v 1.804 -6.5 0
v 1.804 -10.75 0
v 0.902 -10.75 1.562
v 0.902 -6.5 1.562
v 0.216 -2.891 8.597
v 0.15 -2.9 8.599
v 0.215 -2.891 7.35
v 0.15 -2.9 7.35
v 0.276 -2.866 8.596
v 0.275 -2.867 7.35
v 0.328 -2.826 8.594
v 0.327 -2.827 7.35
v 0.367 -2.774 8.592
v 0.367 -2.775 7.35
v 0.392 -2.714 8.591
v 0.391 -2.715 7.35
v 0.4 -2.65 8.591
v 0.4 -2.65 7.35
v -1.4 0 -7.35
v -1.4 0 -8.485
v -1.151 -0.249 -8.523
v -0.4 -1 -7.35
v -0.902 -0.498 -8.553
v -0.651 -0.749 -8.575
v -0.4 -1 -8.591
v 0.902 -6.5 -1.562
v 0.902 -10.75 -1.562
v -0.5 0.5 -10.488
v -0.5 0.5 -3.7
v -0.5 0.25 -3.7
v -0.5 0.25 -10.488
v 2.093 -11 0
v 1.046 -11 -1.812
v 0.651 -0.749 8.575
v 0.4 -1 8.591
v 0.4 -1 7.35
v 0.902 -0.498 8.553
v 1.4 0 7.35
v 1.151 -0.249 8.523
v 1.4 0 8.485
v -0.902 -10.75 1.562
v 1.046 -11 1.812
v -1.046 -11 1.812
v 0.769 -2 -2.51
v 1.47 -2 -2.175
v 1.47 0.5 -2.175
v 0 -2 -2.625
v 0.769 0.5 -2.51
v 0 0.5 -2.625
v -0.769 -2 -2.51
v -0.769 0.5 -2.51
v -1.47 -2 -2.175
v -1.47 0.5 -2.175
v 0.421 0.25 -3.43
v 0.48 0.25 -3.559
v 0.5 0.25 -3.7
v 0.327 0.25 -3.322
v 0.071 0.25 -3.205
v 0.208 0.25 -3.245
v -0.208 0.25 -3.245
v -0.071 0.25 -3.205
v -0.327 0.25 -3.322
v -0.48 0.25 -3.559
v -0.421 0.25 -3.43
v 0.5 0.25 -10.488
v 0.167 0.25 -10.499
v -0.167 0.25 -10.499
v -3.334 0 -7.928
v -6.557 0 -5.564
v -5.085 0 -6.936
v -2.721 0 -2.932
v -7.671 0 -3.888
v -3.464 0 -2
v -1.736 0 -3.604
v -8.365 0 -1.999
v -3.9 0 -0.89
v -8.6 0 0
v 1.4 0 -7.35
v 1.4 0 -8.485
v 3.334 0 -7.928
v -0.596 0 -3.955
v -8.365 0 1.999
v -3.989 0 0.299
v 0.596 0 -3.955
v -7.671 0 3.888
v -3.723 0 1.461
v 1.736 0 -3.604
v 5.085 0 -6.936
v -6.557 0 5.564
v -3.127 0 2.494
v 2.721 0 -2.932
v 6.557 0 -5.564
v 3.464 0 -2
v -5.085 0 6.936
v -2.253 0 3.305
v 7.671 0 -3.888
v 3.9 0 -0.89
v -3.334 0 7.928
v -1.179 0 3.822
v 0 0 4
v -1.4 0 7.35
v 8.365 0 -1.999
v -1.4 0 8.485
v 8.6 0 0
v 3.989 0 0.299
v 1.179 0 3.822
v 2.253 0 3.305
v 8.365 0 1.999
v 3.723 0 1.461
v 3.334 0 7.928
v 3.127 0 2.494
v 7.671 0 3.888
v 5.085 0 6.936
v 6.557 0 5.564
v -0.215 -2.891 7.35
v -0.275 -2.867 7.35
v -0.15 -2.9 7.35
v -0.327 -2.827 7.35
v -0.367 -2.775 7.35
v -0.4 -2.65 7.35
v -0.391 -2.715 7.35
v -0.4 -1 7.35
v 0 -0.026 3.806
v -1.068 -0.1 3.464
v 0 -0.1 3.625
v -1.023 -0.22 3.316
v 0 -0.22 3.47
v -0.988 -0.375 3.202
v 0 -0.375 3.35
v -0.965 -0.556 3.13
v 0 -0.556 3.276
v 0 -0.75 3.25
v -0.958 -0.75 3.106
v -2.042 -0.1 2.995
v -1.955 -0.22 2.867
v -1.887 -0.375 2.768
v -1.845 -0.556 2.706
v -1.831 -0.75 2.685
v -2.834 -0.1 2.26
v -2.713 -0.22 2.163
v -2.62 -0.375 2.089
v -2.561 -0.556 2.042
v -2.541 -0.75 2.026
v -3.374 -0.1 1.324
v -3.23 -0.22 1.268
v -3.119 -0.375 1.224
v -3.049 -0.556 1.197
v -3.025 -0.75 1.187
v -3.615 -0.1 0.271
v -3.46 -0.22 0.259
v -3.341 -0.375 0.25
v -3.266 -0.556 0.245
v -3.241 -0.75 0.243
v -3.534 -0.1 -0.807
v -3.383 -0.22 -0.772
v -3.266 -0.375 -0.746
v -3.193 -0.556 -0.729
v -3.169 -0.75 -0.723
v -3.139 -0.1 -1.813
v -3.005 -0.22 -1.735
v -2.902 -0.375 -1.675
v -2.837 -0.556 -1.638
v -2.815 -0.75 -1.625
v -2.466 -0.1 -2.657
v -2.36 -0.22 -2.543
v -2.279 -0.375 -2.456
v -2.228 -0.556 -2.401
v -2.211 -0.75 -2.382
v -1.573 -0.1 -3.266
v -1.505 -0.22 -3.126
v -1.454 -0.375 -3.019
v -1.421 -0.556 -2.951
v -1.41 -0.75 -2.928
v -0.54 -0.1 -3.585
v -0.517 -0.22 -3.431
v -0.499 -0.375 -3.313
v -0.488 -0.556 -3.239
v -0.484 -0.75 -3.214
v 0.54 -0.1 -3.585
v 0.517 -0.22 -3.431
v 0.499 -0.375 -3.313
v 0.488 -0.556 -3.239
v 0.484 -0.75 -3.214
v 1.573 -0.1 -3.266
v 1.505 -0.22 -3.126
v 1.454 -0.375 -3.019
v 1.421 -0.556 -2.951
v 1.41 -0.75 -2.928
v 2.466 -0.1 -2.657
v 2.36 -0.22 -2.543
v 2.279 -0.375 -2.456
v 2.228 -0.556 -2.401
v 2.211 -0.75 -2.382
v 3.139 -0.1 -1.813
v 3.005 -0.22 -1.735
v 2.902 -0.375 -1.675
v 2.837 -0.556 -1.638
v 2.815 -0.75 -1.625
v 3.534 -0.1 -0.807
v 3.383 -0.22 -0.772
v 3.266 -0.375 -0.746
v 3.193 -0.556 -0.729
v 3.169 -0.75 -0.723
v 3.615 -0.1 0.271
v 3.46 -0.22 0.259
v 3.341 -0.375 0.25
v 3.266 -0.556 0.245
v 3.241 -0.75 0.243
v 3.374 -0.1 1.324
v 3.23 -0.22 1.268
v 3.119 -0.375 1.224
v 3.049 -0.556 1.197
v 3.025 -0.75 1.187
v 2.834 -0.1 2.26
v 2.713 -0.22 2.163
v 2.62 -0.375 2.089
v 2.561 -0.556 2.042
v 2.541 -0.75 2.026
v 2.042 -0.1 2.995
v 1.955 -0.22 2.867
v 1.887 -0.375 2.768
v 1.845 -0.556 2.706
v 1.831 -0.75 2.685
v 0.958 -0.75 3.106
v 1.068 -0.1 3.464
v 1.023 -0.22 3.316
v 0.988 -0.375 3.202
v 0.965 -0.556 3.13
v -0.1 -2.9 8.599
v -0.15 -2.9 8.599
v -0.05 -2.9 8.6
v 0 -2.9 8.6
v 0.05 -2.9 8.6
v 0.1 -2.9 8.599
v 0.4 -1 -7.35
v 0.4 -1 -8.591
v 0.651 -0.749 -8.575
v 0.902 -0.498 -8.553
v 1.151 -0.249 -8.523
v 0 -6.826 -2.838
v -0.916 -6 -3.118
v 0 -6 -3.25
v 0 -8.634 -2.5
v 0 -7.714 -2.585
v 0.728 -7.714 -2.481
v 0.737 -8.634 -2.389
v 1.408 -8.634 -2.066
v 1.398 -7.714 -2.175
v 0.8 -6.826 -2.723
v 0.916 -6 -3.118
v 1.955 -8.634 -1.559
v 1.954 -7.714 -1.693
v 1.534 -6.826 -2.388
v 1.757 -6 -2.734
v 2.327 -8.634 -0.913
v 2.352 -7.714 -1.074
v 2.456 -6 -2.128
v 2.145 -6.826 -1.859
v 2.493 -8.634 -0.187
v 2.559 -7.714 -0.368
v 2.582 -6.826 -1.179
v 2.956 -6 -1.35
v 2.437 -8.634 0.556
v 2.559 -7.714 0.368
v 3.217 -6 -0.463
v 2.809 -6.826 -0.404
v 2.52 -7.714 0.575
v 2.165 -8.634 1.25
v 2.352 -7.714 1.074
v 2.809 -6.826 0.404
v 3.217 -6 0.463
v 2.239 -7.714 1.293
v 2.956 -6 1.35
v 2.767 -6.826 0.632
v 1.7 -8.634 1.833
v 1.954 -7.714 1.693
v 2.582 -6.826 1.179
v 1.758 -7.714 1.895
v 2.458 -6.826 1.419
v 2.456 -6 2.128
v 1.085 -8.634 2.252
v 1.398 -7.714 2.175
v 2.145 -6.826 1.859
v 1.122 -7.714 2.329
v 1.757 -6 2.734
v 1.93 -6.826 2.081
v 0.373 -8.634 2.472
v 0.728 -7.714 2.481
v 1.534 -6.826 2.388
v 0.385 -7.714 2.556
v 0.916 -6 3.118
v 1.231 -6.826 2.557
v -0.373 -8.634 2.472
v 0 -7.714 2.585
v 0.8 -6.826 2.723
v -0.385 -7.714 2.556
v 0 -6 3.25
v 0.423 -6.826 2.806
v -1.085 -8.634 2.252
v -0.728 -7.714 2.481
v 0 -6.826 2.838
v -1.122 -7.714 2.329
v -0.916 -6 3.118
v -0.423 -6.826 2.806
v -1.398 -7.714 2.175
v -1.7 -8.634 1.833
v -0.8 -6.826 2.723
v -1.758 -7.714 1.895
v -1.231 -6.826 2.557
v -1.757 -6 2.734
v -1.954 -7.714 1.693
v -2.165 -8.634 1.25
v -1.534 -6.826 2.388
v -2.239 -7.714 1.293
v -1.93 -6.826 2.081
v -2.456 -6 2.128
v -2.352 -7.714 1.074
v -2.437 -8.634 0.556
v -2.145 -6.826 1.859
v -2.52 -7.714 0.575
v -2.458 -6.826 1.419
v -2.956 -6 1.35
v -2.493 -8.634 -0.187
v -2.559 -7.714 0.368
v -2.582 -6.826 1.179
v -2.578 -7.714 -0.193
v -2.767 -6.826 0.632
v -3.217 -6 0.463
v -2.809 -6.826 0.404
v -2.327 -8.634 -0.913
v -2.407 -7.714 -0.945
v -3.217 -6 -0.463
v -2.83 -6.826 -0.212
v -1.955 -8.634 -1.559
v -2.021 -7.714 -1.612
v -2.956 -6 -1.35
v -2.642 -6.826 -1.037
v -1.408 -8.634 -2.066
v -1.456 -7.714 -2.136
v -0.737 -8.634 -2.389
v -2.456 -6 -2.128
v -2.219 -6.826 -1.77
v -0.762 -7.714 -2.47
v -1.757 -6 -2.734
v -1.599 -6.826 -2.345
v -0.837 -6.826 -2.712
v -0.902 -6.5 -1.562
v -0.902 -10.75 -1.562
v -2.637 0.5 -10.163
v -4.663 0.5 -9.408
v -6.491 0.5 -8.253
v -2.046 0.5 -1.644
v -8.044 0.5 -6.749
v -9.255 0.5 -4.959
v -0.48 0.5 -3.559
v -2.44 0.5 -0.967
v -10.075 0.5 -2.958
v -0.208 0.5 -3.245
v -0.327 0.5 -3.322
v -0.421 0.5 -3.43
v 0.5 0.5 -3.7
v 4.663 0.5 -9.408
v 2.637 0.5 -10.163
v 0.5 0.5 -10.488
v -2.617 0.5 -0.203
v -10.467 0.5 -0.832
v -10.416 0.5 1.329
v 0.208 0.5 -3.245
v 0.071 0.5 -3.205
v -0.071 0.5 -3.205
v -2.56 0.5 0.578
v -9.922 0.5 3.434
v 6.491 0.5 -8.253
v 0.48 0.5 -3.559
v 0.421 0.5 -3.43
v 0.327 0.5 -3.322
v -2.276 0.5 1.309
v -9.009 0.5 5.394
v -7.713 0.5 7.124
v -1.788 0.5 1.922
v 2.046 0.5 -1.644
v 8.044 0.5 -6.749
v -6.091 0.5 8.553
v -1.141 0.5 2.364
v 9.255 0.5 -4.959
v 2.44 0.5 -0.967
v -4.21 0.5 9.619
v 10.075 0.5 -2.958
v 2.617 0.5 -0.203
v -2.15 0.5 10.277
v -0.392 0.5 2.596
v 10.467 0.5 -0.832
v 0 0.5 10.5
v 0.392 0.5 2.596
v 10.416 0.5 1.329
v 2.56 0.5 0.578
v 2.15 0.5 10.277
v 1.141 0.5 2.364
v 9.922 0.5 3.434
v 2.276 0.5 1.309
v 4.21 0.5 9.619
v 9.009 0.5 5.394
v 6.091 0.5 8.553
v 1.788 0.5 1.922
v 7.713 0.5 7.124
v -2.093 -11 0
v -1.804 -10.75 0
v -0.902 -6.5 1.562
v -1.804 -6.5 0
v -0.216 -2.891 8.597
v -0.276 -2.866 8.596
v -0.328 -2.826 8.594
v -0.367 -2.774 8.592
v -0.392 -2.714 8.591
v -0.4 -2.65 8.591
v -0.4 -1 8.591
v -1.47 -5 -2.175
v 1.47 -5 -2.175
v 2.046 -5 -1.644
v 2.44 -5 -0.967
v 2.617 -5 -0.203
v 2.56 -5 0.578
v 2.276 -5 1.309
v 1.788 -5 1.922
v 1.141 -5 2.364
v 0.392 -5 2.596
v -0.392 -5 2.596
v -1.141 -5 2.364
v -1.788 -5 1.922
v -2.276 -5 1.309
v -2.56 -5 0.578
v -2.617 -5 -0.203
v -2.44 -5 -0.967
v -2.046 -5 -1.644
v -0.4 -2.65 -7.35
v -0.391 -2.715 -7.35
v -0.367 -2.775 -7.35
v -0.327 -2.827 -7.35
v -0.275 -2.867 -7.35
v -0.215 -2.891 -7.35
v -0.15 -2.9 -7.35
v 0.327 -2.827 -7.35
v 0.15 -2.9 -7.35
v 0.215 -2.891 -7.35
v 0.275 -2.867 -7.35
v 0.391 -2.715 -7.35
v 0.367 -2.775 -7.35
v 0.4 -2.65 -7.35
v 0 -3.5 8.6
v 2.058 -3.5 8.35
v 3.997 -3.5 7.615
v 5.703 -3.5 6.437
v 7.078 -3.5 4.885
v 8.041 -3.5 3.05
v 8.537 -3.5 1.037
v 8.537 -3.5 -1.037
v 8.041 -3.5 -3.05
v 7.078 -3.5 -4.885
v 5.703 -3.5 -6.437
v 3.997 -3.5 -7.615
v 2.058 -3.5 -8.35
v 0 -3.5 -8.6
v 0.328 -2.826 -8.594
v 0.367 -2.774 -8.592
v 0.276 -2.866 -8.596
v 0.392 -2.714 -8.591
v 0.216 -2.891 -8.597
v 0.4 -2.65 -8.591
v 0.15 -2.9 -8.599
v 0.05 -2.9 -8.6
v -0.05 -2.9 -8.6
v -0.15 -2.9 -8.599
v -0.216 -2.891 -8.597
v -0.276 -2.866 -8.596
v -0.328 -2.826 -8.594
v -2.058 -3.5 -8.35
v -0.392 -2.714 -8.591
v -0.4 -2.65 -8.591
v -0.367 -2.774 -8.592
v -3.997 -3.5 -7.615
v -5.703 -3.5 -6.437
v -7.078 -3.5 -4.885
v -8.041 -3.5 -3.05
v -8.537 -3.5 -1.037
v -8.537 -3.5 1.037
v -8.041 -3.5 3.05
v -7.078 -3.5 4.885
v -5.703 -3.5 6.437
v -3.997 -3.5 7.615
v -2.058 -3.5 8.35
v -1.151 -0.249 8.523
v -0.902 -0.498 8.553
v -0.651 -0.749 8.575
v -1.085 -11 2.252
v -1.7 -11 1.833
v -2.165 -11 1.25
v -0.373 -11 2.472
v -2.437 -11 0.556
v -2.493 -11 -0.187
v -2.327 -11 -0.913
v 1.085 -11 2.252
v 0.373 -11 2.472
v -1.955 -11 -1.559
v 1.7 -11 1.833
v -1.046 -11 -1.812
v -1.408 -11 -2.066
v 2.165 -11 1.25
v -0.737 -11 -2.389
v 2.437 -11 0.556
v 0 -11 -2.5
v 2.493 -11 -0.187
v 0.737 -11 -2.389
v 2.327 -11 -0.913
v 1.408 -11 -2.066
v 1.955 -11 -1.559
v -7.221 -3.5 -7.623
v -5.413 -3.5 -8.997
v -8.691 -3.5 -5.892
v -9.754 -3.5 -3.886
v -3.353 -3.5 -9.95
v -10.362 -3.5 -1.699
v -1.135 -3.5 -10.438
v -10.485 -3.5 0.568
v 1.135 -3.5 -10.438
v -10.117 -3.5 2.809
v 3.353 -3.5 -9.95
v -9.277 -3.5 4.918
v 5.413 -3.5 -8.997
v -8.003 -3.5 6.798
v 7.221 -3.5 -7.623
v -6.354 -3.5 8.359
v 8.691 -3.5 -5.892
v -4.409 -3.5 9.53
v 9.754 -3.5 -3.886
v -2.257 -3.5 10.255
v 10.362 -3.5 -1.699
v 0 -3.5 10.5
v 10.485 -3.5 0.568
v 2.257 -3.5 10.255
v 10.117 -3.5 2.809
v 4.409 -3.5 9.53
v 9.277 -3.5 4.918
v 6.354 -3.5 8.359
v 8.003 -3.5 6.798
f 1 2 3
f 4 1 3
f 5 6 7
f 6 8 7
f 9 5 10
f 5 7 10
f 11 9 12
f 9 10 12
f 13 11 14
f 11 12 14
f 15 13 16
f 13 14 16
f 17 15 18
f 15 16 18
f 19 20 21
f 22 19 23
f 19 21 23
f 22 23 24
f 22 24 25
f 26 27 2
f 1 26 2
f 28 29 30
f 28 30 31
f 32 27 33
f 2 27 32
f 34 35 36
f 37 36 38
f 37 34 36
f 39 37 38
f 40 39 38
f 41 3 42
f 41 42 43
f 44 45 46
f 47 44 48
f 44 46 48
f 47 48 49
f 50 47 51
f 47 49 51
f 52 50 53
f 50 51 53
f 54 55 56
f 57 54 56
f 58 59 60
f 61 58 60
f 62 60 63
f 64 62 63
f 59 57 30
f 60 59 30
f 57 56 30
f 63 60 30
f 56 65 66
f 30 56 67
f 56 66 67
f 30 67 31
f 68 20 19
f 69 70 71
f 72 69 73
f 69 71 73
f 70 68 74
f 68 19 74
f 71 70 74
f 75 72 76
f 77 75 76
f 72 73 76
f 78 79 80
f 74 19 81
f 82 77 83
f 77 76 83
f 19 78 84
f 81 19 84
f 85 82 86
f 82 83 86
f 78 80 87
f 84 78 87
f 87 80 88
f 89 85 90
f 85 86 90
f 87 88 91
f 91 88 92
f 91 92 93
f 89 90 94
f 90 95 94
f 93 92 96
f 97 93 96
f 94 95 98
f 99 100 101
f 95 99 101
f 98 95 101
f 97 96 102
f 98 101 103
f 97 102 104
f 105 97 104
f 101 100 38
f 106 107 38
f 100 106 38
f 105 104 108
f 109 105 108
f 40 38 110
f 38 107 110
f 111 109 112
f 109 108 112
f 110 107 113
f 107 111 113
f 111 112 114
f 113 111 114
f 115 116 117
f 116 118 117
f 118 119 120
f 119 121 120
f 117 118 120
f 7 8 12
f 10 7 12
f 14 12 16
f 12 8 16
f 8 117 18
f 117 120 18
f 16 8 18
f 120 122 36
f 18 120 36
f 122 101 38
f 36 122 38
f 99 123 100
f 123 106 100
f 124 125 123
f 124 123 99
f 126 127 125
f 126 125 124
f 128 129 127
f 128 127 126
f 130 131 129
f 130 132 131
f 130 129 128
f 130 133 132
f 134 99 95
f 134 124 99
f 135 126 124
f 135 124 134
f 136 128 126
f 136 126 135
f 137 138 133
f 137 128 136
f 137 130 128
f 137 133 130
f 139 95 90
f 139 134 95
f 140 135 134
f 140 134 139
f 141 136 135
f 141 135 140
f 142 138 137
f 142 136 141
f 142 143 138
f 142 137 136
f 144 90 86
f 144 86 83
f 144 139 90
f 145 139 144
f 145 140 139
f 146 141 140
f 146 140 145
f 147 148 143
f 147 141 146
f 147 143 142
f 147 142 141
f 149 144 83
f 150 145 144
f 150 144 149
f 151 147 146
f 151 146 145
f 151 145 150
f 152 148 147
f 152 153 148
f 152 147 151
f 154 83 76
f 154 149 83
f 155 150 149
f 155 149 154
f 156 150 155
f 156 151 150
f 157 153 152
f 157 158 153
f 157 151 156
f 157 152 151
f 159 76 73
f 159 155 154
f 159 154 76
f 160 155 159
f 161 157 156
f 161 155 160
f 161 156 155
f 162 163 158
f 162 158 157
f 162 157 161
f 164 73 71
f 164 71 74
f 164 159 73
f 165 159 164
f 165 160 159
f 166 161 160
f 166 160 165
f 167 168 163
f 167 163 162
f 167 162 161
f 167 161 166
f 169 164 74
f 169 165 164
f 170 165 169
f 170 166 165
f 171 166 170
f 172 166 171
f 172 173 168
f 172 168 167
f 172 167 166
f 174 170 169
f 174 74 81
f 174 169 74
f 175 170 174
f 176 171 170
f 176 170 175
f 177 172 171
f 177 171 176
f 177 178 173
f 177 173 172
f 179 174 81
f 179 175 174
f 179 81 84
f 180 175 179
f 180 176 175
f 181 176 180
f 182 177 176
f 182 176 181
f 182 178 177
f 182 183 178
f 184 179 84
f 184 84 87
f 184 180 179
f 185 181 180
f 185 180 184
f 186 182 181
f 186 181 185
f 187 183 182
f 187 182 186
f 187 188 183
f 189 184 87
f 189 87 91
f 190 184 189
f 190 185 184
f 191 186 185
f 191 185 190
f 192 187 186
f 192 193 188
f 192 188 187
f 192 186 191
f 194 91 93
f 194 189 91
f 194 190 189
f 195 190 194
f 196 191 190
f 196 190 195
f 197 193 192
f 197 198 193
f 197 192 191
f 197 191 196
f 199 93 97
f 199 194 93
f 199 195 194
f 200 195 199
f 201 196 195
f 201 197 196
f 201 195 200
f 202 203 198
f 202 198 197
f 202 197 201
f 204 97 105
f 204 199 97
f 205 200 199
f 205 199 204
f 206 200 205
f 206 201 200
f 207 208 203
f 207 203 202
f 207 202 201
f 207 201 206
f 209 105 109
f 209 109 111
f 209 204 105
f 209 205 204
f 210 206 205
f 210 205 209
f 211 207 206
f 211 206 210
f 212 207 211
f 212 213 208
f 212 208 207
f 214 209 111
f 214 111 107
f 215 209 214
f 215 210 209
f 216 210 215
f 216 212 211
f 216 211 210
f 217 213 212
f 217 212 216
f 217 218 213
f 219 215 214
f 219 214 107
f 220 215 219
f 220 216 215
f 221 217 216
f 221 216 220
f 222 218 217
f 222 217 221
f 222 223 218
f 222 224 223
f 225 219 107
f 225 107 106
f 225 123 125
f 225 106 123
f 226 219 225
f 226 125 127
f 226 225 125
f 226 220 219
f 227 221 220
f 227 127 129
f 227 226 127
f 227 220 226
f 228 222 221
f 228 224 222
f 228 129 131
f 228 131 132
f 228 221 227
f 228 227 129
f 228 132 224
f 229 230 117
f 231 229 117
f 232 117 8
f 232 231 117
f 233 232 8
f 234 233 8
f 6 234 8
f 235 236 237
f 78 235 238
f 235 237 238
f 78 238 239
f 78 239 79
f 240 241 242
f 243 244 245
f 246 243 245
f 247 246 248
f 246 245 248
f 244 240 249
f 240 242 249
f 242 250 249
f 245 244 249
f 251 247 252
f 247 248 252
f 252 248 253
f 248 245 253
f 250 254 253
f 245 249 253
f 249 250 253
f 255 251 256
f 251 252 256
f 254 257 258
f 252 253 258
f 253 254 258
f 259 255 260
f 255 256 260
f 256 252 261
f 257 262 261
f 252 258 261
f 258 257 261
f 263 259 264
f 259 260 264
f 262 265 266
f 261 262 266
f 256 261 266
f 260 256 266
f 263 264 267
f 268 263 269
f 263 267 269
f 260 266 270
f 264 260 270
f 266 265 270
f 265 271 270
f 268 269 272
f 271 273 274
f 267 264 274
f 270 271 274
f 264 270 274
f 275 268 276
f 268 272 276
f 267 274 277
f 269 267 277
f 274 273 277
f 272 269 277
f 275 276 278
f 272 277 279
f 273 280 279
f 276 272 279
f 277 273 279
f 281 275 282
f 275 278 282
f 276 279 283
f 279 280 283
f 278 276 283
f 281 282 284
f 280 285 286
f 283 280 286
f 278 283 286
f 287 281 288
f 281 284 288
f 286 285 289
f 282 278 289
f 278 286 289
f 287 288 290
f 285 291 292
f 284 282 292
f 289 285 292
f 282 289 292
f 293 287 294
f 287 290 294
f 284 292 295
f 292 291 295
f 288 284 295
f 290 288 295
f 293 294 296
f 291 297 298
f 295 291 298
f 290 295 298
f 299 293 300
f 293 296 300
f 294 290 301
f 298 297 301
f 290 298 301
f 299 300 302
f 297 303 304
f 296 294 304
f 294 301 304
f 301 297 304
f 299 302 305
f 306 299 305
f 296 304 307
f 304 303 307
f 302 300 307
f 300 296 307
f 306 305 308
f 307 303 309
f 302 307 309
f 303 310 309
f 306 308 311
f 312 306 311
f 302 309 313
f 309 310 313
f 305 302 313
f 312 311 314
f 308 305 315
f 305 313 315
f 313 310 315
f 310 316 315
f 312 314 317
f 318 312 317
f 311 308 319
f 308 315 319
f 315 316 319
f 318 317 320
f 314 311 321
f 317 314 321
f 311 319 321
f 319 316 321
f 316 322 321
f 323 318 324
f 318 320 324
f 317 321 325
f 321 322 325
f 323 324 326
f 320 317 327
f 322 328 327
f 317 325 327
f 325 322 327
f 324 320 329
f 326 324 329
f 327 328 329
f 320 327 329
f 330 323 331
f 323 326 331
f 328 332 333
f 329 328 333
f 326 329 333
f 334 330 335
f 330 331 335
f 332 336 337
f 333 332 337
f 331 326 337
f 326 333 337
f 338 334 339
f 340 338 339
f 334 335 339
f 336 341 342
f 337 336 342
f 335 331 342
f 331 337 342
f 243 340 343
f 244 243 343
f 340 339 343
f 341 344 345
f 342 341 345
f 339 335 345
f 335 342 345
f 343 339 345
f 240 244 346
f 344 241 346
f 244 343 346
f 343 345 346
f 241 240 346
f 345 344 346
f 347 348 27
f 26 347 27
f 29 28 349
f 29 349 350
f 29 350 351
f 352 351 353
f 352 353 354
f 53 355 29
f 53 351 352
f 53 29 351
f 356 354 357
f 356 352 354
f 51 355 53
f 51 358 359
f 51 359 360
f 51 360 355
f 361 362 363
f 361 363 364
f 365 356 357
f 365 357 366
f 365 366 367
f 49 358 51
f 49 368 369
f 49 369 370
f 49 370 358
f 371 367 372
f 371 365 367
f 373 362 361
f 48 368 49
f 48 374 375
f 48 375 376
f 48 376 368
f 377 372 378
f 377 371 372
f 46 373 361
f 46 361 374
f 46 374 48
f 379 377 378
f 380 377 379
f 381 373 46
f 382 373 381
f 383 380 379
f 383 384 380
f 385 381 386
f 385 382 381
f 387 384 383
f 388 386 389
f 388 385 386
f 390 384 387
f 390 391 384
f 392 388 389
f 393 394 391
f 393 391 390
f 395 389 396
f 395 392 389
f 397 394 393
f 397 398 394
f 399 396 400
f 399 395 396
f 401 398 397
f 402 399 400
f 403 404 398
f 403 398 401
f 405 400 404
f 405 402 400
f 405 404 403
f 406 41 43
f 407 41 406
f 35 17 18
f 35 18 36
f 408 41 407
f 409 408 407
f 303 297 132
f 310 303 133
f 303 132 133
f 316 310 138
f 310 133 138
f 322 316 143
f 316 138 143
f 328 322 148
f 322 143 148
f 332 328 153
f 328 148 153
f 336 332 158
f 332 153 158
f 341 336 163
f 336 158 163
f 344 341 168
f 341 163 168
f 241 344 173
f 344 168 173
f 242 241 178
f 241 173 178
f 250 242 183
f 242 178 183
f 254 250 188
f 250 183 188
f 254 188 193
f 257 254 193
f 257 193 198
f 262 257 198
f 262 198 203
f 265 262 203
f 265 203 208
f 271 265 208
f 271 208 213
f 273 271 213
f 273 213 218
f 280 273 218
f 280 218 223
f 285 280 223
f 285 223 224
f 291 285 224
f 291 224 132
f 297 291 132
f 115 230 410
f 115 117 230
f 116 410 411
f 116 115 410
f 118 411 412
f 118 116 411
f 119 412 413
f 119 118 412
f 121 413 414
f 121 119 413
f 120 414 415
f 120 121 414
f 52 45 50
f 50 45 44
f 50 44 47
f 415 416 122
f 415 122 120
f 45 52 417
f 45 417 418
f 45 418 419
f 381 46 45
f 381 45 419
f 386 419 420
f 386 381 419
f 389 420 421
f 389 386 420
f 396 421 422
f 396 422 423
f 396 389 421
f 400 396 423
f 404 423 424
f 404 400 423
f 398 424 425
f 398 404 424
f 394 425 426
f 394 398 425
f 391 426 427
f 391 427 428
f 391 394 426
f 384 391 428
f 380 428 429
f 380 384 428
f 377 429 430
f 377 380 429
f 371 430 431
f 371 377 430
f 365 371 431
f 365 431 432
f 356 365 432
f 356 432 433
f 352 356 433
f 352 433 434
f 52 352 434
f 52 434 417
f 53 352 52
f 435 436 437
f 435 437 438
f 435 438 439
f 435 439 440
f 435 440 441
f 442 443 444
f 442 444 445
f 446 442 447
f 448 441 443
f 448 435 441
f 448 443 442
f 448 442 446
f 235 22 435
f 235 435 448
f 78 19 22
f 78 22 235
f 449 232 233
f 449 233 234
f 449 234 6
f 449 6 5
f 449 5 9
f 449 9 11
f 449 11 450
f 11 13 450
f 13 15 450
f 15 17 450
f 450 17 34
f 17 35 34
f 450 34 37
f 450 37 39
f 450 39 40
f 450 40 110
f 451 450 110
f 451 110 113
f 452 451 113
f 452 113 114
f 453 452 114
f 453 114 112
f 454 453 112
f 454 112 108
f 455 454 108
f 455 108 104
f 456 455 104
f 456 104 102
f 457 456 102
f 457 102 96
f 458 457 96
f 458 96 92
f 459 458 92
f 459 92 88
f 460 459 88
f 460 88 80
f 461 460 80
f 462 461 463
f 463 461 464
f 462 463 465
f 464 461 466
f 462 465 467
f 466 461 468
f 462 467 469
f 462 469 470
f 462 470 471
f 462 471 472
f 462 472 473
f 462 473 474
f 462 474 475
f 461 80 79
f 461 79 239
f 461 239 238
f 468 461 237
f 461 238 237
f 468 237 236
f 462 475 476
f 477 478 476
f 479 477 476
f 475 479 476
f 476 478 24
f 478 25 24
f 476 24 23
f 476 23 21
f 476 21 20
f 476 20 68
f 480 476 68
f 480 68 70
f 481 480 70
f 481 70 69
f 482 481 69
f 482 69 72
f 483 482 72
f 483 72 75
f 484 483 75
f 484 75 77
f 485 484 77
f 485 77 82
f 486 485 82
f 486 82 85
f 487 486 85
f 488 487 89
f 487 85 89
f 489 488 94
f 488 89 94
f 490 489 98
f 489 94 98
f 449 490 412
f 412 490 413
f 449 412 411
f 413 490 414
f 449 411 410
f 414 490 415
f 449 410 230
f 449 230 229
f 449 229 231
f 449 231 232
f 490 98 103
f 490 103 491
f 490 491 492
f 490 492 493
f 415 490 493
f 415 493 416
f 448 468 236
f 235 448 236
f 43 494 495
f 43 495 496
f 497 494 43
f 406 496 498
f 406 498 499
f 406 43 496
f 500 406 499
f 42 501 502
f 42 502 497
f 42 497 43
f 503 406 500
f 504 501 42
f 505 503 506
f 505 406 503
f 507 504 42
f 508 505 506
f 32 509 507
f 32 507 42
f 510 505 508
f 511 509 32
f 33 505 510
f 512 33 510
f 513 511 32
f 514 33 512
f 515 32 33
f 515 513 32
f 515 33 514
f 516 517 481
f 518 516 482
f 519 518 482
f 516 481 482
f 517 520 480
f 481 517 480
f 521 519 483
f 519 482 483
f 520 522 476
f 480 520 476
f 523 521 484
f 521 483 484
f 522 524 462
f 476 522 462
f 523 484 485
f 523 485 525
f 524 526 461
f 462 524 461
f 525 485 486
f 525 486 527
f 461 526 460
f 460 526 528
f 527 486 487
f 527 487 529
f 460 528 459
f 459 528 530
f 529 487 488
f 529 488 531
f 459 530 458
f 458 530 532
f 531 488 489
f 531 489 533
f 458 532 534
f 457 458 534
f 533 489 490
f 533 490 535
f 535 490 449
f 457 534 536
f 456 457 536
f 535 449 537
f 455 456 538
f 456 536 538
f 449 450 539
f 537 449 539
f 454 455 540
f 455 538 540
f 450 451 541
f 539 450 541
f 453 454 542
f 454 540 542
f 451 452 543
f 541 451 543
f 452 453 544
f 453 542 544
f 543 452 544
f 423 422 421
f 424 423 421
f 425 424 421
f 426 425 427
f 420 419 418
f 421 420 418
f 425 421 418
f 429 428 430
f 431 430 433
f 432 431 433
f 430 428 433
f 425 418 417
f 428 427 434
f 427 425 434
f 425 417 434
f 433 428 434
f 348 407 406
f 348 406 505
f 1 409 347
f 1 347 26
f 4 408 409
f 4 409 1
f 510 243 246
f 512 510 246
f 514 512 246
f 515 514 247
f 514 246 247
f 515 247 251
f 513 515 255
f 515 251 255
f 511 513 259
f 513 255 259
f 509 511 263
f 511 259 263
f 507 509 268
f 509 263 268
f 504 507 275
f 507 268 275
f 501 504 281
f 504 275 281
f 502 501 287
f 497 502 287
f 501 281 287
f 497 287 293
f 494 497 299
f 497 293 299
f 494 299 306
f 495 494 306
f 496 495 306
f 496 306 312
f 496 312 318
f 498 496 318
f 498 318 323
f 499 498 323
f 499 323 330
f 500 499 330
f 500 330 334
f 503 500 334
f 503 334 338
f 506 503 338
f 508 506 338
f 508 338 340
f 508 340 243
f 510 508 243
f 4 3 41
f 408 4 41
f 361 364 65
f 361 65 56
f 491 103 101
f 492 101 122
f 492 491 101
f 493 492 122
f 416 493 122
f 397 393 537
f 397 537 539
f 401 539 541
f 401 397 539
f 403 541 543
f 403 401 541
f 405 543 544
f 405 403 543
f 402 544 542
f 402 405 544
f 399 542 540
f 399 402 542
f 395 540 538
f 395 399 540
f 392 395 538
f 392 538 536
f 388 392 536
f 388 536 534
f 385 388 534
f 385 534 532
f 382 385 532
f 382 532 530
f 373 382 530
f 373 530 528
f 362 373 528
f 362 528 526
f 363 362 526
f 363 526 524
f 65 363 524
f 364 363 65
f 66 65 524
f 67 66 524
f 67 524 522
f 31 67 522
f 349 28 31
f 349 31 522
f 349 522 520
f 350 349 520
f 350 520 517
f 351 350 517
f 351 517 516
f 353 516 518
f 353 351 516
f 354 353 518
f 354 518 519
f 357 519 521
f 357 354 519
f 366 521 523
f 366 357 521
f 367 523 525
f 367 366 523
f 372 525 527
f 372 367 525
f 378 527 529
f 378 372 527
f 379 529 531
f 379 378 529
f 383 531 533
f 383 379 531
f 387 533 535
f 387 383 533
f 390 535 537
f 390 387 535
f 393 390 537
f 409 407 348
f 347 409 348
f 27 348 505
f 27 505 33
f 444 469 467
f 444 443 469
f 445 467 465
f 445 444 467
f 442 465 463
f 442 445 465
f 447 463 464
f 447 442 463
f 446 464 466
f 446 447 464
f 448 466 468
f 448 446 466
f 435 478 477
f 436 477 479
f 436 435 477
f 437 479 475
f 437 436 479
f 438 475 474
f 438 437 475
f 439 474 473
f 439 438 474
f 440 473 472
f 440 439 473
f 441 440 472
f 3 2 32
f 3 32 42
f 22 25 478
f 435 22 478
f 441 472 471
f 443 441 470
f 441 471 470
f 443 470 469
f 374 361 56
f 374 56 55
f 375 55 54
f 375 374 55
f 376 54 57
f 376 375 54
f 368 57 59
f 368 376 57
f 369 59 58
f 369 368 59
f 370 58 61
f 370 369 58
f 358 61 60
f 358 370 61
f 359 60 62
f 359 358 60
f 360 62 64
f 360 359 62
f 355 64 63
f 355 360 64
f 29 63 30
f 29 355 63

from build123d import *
from build123d.topology import SkipClean

# Parameters (mm, degrees)
SKETCH1_R           = 10.5
SKETCH1_R_2         = 8.6
BOSS_EXTRUDE1_DEPTH = 3.5
BOSS_EXTRUDE2_DEPTH = 1.25
BOSS_EXTRUDE3_START = 17.2
BOSS_EXTRUDE3_DEPTH = 1.25
BOSS_EXTRUDE4_START = 0.5
SKETCH3_R           = 10.5
BOSS_EXTRUDE4_DEPTH = 0.5
SKETCH5_R           = 3.25
BOSS_EXTRUDE5_DEPTH = 6
FILLET2_R           = 0.75
CUT_EXTRUDE1_DEPTH  = 5.5
FILLET1_R           = 0.25
SKETCH7_R           = 2.625
CUT_EXTRUDE2_DEPTH  = 2.5
CUT_EXTRUDE3_DEPTH  = 0.25
SKETCH11_R          = 2.5
BOSS_EXTRUDE6_DEPTH = 5
CUT_EXTRUDE4_START  = 5
CUT_EXTRUDE4_DEPTH  = 4.5
CHAMFER2_SIZE       = 0.25
FILLET3_R           = 5


with BuildPart() as part:
    # Sketch1 → Boss-Extrude1 (new body)
    with BuildSketch(Plane(origin=(0, 0, 0), x_dir=(1, 0, 0), z_dir=(0, 1, 0))):
        with Locations(Location((0, 0, 0), (0, 0, 270))):
            Circle(SKETCH1_R)
        with Locations(Location((0, 0, 0), (0, 0, 270))):
            Circle(SKETCH1_R_2, mode=Mode.SUBTRACT)
    extrude(amount=-BOSS_EXTRUDE1_DEPTH)

    # Sketch2 → Boss-Extrude2 (add)
    with BuildSketch(Plane(origin=(0, 0, 8.6), x_dir=(-1, 0, 0), z_dir=(0, 0, -1))):
        Polygon((0.4, -2.9), (-0.4, -2.9), (-0.4, -1), (-1.4, 0), (1.4, 0), (0.4, -1), align=None)
    extrude(amount=BOSS_EXTRUDE2_DEPTH)

    # Sketch2<2> → Boss-Extrude3 (add)
    with BuildSketch(Plane(origin=(0, 0, 8.6), x_dir=(-1, 0, 0), z_dir=(0, 0, -1)).offset(BOSS_EXTRUDE3_START)):
        Polygon((0.4, -2.9), (-0.4, -2.9), (-0.4, -1), (-1.4, 0), (1.4, 0), (0.4, -1), align=None)
    extrude(amount=-BOSS_EXTRUDE3_DEPTH)

    # Sketch3 → Boss-Extrude4 (add)
    with BuildSketch(Plane(origin=(0, 0, 0), x_dir=(1, 0, 0), z_dir=(0, 1, 0)).offset(BOSS_EXTRUDE4_START)):
        with Locations(Location((0, 0, 0), (0, 0, 270))):
            Circle(SKETCH3_R)
    extrude(amount=-BOSS_EXTRUDE4_DEPTH)

    # Sketch5 → Boss-Extrude5 (add)
    with BuildSketch(Plane.XZ):
        with Locations(Location((0, 0, 0), (0, 0, 90))):
            Circle(SKETCH5_R)
    extrude(amount=BOSS_EXTRUDE5_DEPTH)

    # Fillet2
    fillet2_edges = [part.edges().sort_by_distance(p)[0] for p in [
        (0, 0, -3.25),
    ]]
    fillet(fillet2_edges, radius=FILLET2_R)

    # Sketch4 → Cut-Extrude1 (cut)
    with BuildSketch(Plane(origin=(0, 0.5, 0), x_dir=(1, 0, 0), z_dir=(0, 1, 0))):
        with BuildLine():
            Line((-1.469693846, 2.175), (1.469693846, 2.175))
            ThreePointArc((1.469693846, 2.175), (0, -2.625), (-1.469693846, 2.175))
        make_face()
    extrude(amount=-CUT_EXTRUDE1_DEPTH, mode=Mode.SUBTRACT)

    # Fillet1
    fillet1_edges = [part.edges().sort_by_distance(p)[0] for p in [
        (-0.4, -2.9, 7.970346319),
        (0.4, -2.9, 7.970346319),
        (-0.4, -2.9, -7.970346319),
        (0.4, -2.9, -7.970346319),
    ]]
    fillet(fillet1_edges, radius=FILLET1_R)

    # Sketch7 → Cut-Extrude2 (cut)
    with SkipClean():  # the faces are left unmerged after this step: merging them gives an invalid solid
        with BuildSketch(Plane(origin=(0, 0.5, 0), x_dir=(1, 0, 0), z_dir=(0, 1, 0))):
            with Locations(Location((0, 0, 0), (0, 0, 270))):
                Circle(SKETCH7_R)
        extrude(amount=-CUT_EXTRUDE2_DEPTH, mode=Mode.SUBTRACT)

    # Sketch9 → Cut-Extrude3 (cut)
    with SkipClean():  # the faces are left unmerged after this step: merging them gives an invalid solid
        with BuildSketch(Plane(origin=(0, 0.5, 0), x_dir=(1, 0, 0), z_dir=(0, 1, 0))):
            with BuildLine():
                Line((-0.5, 3.7), (-0.5, 13.7))
                ThreePointArc((-0.5, 13.7), (0, 14.2), (0.5, 13.7))
                Line((0.5, 13.7), (0.5, 3.7))
                ThreePointArc((0.5, 3.7), (0, 3.2), (-0.5, 3.7))
            make_face()
        extrude(amount=-CUT_EXTRUDE3_DEPTH, mode=Mode.SUBTRACT)

    # Sketch11 → Boss-Extrude6 (add)
    with SkipClean():  # the faces are left unmerged after this step: merging them gives an invalid solid
        with BuildSketch(Plane.XZ.offset(6)):
            with Locations(Location((0, 0, 0), (0, 0, 270))):
                Circle(SKETCH11_R)
        extrude(amount=BOSS_EXTRUDE6_DEPTH)

    # Sketch10 → Cut-Extrude4 (cut)
    with SkipClean():  # the faces are left unmerged after this step: merging them gives an invalid solid
        with BuildSketch(Plane.XZ.offset(6).offset(CUT_EXTRUDE4_START)):
            Polygon((1.804219591, 0), (0.902109796, 1.5625), (-0.902109796, 1.5625), (-1.804219591, 0), (-0.902109796, -1.5625), (0.902109796, -1.5625), align=None)
        extrude(amount=-CUT_EXTRUDE4_DEPTH, mode=Mode.SUBTRACT)

    # Chamfer2
    chamfer2_edges = [part.edges().sort_by_distance(p)[0] for p in [
        (-1.353164693, -11, -0.78125),
        (-1.353164693, -11, 0.78125),
        (0, -11, 1.5625),
        (1.353164693, -11, 0.78125),
        (1.353164693, -11, -0.78125),
        (0, -11, -1.5625),
    ]]
    chamfer(chamfer2_edges, length=CHAMFER2_SIZE)

    # Fillet3
    # the kernel refuses this fillet: 5 mm, written as the material it adds along each edge
    with BuildSketch(Plane(origin=(0, -6, 0), x_dir=(0, 0, -1), z_dir=(-1, 0, 0))) as fillet3_piece_1:
        with BuildLine():
            CenterArc((7.5, 2.633913438), FILLET3_R, 180, 31.788330617)
            Line((3.25, 0), (3.165, -0.052678269))
            ThreePointArc((3.165, -0.052678269), (2.875, -0.1), (2.5, -0.1))
            Line((2.5, -0.1), (2.4, 0))
            Line((2.4, 0), (2.4, 2.633913438))
            Line((2.4, 2.633913438), (2.5, 2.633913438))
        make_face()
    revolve(axis=Axis((0, -6, 0), (0, -1, 0)))


solid = part.part
